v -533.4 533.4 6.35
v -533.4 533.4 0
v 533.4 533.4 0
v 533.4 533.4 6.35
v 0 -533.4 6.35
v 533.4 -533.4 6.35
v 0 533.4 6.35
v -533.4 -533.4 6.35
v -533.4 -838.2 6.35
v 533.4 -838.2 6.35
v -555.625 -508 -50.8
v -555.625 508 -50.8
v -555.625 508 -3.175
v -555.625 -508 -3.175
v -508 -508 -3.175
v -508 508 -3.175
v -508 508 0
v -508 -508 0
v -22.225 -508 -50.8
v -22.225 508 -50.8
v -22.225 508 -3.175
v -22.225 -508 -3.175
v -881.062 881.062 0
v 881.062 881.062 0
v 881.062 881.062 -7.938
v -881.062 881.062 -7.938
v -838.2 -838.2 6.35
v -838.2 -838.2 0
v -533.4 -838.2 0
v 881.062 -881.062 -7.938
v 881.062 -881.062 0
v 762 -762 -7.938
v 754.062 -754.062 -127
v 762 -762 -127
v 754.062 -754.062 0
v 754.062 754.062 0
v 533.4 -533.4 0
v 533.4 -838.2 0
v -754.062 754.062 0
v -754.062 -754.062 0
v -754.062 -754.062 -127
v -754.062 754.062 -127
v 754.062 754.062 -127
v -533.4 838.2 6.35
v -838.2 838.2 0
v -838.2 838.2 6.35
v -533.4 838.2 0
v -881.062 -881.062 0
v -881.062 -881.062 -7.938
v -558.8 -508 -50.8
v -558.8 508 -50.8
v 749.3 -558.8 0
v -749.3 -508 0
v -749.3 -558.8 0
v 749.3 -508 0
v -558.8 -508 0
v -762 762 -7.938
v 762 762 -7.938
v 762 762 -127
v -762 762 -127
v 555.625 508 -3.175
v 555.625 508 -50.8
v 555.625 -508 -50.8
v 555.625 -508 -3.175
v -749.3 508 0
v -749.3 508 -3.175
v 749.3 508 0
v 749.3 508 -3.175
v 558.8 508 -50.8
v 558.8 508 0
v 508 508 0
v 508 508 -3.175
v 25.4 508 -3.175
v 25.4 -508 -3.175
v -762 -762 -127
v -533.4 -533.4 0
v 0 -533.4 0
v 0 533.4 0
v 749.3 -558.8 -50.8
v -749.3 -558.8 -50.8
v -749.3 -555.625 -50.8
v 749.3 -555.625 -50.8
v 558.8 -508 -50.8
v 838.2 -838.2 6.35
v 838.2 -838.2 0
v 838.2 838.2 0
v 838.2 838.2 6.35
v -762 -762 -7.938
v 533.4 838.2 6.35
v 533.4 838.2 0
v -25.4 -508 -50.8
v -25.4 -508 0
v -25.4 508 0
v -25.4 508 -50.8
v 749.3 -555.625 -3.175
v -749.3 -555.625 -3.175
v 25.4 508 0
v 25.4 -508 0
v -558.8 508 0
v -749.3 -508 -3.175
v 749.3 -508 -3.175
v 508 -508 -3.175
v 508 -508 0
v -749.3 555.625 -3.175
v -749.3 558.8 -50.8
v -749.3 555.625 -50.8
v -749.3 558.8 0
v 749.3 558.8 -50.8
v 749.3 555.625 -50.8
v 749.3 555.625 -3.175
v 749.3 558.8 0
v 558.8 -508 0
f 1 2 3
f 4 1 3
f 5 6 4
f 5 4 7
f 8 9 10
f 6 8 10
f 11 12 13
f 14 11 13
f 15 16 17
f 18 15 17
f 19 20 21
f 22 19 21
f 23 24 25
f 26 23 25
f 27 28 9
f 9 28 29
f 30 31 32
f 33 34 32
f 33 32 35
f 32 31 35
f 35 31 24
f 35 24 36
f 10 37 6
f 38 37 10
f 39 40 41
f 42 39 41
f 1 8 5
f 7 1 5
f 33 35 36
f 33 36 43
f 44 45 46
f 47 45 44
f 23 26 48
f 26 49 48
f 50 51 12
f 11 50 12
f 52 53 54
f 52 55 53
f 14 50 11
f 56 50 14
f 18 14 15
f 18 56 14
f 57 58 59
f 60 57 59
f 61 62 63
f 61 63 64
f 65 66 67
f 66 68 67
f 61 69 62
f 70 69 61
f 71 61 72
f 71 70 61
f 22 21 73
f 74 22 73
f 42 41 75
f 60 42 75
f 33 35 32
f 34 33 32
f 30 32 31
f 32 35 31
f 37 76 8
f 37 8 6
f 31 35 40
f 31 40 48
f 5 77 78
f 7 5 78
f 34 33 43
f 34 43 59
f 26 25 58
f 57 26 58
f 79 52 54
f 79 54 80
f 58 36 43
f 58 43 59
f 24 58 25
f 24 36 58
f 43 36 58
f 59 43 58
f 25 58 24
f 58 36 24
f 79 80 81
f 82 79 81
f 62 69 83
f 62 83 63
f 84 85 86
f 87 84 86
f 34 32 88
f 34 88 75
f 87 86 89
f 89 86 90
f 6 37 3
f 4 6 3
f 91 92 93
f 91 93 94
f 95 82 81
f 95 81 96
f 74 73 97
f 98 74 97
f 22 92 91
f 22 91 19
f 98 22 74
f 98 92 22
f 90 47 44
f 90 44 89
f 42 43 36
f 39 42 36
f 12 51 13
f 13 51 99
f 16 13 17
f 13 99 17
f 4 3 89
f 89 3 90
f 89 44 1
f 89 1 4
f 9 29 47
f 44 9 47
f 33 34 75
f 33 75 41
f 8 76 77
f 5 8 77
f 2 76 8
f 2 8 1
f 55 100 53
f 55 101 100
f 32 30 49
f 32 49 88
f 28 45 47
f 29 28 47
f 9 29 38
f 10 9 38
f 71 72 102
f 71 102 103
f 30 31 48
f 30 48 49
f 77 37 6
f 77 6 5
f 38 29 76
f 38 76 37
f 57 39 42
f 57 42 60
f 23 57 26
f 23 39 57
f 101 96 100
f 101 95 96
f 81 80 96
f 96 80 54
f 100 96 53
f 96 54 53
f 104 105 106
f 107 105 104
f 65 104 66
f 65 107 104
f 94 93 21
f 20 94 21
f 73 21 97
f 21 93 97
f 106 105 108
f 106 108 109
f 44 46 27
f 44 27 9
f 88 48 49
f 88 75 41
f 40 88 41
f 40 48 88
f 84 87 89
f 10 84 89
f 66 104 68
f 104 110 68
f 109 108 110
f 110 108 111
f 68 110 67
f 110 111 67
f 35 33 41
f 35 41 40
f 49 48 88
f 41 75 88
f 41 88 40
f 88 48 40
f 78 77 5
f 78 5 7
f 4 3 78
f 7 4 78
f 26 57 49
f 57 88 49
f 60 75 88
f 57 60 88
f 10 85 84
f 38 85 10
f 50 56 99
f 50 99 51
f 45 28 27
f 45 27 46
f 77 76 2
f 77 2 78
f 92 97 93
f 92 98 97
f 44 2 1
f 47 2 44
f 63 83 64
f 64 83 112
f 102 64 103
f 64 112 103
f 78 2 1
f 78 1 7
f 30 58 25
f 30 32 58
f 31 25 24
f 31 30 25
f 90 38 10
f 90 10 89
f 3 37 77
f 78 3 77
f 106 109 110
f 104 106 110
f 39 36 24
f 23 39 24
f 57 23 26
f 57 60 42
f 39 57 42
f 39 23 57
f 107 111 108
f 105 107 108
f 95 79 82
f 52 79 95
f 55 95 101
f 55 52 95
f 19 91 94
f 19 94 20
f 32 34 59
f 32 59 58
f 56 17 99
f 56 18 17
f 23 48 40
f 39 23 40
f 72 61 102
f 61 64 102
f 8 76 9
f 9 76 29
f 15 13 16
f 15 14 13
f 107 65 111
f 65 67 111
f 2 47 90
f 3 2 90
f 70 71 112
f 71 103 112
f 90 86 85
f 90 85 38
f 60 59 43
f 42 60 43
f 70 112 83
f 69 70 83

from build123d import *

# Parameters (mm, degrees)
F1_DEPTH  = 881.0625
F3_DEPTH  = 152.4
F6_DEPTH  = 881.0625
F8_DEPTH  = 152.4
F10_W     = 304.8
F10_H     = 1676.4
F11_DEPTH = 6.35
F13_W     = 1066.8
F13_H     = 304.8
F14_DEPTH = 6.35
F16_W     = 533.4
F16_H     = 1066.8
F17_DEPTH = 6.35
F20_DEPTH = 749.3
F23_DEPTH = 508
F26_DEPTH = 508


with BuildPart() as f1:
    # F0 (on Right) → F1 (new body, symmetric)
    with BuildSketch(Plane.YZ):
        Polygon((-754.0625, -127), (-754.0625, 0), (-881.0625, 0), (-881.0625, -7.9375), (-762, -7.9375), (-762, -127), align=None)
    extrude(amount=F1_DEPTH, both=True)

    # F2 (on face) → F3 (cut)
    with BuildSketch(Plane.XY):
        Polygon((-754.0625, -754.0625), (-881.0625, -754.0625), (-881.0625, -881.0625), align=None)
        Polygon((881.0625, -754.0625), (754.0625, -754.0625), (881.0625, -881.0625), align=None)
    extrude(amount=-F3_DEPTH, mode=Mode.SUBTRACT)


with BuildPart() as f4_1:
    # F4: instance of F1
    add(f1.part.mirror(Plane.XZ))


with BuildPart() as f6:
    # F5 (on Front) → F6 (new body, symmetric)
    with BuildSketch(Plane.XZ):
        Polygon((881.0625, 0), (754.0625, 0), (754.0625, -127), (762, -127), (762, -7.9375), (881.0625, -7.9375), align=None)
    extrude(amount=F6_DEPTH, both=True)

    # F7 (on face) → F8 (cut)
    with BuildSketch(Plane.XY):
        Polygon((881.0625, 881.0625), (754.0625, 881.0625), (754.0625, 754.0625), align=None)
        Polygon((754.0625, -754.0625), (754.0625, -881.0625), (881.0625, -881.0625), align=None)
    extrude(amount=-F8_DEPTH, mode=Mode.SUBTRACT)


with BuildPart() as f9_1:
    # F9: instance of F6
    add(f6.part.mirror(Plane.YZ))


with BuildPart() as f11:
    # F10 (on Top) → F11 (new body)
    with BuildSketch(Plane.XY):
        with Locations((-685.8, 0)):
            Rectangle(F10_W, F10_H)
    extrude(amount=F11_DEPTH)


with BuildPart() as f12_1:
    # F12: instance of F11
    add(f11.part.mirror(Plane.YZ))


with BuildPart() as f14:
    # F13 (on Top) → F14 (new body)
    with BuildSketch(Plane.XY):
        with Locations((0, 685.8)):
            Rectangle(F13_W, F13_H)
    extrude(amount=F14_DEPTH)


with BuildPart() as f15_1:
    # F15: instance of F14
    add(f14.part.mirror(Plane.XZ))


with BuildPart() as f17:
    # F16 (on Top) → F17 (new body)
    with BuildSketch(Plane.XY):
        with Locations((-266.7, 0)):
            Rectangle(F16_W, F16_H)
    extrude(amount=F17_DEPTH)


with BuildPart() as f18_1:
    # F18: instance of F17
    add(f17.part.mirror(Plane.YZ))


with BuildPart() as f20:
    # F19 (on Right) → F20 (new body, symmetric)
    with BuildSketch(Plane.YZ):
        Polygon((-508, 0), (-558.8, 0), (-558.8, -50.8), (-555.625, -50.8), (-555.625, -3.175), (-508, -3.175), align=None)
    extrude(amount=F20_DEPTH, both=True)


with BuildPart() as f21_1:
    # F21: instance of F20
    add(f20.part.mirror(Plane.XZ))


with BuildPart() as f23:
    # F22 (on Front) → F23 (new body, symmetric)
    with BuildSketch(Plane.XZ):
        Polygon((-508, 0), (-558.8, 0), (-558.8, -50.8), (-555.625, -50.8), (-555.625, -3.175), (-508, -3.175), align=None)
    extrude(amount=F23_DEPTH, both=True)


with BuildPart() as f24_1:
    # F24: instance of F23
    add(f23.part.mirror(Plane.YZ))


with BuildPart() as f26:
    # F25 (on Front) → F26 (new body, symmetric)
    with BuildSketch(Plane.XZ):
        Polygon((25.4, 0), (-25.4, 0), (-25.4, -50.8), (-22.225, -50.8), (-22.225, -3.175), (25.4, -3.175), align=None)
    extrude(amount=F26_DEPTH, both=True)


solid = Compound([f1.part, f4_1.part, f6.part, f9_1.part, f11.part, f12_1.part, f14.part, f15_1.part, f17.part, f18_1.part, f20.part, f21_1.part, f23.part, f24_1.part, f26.part])
